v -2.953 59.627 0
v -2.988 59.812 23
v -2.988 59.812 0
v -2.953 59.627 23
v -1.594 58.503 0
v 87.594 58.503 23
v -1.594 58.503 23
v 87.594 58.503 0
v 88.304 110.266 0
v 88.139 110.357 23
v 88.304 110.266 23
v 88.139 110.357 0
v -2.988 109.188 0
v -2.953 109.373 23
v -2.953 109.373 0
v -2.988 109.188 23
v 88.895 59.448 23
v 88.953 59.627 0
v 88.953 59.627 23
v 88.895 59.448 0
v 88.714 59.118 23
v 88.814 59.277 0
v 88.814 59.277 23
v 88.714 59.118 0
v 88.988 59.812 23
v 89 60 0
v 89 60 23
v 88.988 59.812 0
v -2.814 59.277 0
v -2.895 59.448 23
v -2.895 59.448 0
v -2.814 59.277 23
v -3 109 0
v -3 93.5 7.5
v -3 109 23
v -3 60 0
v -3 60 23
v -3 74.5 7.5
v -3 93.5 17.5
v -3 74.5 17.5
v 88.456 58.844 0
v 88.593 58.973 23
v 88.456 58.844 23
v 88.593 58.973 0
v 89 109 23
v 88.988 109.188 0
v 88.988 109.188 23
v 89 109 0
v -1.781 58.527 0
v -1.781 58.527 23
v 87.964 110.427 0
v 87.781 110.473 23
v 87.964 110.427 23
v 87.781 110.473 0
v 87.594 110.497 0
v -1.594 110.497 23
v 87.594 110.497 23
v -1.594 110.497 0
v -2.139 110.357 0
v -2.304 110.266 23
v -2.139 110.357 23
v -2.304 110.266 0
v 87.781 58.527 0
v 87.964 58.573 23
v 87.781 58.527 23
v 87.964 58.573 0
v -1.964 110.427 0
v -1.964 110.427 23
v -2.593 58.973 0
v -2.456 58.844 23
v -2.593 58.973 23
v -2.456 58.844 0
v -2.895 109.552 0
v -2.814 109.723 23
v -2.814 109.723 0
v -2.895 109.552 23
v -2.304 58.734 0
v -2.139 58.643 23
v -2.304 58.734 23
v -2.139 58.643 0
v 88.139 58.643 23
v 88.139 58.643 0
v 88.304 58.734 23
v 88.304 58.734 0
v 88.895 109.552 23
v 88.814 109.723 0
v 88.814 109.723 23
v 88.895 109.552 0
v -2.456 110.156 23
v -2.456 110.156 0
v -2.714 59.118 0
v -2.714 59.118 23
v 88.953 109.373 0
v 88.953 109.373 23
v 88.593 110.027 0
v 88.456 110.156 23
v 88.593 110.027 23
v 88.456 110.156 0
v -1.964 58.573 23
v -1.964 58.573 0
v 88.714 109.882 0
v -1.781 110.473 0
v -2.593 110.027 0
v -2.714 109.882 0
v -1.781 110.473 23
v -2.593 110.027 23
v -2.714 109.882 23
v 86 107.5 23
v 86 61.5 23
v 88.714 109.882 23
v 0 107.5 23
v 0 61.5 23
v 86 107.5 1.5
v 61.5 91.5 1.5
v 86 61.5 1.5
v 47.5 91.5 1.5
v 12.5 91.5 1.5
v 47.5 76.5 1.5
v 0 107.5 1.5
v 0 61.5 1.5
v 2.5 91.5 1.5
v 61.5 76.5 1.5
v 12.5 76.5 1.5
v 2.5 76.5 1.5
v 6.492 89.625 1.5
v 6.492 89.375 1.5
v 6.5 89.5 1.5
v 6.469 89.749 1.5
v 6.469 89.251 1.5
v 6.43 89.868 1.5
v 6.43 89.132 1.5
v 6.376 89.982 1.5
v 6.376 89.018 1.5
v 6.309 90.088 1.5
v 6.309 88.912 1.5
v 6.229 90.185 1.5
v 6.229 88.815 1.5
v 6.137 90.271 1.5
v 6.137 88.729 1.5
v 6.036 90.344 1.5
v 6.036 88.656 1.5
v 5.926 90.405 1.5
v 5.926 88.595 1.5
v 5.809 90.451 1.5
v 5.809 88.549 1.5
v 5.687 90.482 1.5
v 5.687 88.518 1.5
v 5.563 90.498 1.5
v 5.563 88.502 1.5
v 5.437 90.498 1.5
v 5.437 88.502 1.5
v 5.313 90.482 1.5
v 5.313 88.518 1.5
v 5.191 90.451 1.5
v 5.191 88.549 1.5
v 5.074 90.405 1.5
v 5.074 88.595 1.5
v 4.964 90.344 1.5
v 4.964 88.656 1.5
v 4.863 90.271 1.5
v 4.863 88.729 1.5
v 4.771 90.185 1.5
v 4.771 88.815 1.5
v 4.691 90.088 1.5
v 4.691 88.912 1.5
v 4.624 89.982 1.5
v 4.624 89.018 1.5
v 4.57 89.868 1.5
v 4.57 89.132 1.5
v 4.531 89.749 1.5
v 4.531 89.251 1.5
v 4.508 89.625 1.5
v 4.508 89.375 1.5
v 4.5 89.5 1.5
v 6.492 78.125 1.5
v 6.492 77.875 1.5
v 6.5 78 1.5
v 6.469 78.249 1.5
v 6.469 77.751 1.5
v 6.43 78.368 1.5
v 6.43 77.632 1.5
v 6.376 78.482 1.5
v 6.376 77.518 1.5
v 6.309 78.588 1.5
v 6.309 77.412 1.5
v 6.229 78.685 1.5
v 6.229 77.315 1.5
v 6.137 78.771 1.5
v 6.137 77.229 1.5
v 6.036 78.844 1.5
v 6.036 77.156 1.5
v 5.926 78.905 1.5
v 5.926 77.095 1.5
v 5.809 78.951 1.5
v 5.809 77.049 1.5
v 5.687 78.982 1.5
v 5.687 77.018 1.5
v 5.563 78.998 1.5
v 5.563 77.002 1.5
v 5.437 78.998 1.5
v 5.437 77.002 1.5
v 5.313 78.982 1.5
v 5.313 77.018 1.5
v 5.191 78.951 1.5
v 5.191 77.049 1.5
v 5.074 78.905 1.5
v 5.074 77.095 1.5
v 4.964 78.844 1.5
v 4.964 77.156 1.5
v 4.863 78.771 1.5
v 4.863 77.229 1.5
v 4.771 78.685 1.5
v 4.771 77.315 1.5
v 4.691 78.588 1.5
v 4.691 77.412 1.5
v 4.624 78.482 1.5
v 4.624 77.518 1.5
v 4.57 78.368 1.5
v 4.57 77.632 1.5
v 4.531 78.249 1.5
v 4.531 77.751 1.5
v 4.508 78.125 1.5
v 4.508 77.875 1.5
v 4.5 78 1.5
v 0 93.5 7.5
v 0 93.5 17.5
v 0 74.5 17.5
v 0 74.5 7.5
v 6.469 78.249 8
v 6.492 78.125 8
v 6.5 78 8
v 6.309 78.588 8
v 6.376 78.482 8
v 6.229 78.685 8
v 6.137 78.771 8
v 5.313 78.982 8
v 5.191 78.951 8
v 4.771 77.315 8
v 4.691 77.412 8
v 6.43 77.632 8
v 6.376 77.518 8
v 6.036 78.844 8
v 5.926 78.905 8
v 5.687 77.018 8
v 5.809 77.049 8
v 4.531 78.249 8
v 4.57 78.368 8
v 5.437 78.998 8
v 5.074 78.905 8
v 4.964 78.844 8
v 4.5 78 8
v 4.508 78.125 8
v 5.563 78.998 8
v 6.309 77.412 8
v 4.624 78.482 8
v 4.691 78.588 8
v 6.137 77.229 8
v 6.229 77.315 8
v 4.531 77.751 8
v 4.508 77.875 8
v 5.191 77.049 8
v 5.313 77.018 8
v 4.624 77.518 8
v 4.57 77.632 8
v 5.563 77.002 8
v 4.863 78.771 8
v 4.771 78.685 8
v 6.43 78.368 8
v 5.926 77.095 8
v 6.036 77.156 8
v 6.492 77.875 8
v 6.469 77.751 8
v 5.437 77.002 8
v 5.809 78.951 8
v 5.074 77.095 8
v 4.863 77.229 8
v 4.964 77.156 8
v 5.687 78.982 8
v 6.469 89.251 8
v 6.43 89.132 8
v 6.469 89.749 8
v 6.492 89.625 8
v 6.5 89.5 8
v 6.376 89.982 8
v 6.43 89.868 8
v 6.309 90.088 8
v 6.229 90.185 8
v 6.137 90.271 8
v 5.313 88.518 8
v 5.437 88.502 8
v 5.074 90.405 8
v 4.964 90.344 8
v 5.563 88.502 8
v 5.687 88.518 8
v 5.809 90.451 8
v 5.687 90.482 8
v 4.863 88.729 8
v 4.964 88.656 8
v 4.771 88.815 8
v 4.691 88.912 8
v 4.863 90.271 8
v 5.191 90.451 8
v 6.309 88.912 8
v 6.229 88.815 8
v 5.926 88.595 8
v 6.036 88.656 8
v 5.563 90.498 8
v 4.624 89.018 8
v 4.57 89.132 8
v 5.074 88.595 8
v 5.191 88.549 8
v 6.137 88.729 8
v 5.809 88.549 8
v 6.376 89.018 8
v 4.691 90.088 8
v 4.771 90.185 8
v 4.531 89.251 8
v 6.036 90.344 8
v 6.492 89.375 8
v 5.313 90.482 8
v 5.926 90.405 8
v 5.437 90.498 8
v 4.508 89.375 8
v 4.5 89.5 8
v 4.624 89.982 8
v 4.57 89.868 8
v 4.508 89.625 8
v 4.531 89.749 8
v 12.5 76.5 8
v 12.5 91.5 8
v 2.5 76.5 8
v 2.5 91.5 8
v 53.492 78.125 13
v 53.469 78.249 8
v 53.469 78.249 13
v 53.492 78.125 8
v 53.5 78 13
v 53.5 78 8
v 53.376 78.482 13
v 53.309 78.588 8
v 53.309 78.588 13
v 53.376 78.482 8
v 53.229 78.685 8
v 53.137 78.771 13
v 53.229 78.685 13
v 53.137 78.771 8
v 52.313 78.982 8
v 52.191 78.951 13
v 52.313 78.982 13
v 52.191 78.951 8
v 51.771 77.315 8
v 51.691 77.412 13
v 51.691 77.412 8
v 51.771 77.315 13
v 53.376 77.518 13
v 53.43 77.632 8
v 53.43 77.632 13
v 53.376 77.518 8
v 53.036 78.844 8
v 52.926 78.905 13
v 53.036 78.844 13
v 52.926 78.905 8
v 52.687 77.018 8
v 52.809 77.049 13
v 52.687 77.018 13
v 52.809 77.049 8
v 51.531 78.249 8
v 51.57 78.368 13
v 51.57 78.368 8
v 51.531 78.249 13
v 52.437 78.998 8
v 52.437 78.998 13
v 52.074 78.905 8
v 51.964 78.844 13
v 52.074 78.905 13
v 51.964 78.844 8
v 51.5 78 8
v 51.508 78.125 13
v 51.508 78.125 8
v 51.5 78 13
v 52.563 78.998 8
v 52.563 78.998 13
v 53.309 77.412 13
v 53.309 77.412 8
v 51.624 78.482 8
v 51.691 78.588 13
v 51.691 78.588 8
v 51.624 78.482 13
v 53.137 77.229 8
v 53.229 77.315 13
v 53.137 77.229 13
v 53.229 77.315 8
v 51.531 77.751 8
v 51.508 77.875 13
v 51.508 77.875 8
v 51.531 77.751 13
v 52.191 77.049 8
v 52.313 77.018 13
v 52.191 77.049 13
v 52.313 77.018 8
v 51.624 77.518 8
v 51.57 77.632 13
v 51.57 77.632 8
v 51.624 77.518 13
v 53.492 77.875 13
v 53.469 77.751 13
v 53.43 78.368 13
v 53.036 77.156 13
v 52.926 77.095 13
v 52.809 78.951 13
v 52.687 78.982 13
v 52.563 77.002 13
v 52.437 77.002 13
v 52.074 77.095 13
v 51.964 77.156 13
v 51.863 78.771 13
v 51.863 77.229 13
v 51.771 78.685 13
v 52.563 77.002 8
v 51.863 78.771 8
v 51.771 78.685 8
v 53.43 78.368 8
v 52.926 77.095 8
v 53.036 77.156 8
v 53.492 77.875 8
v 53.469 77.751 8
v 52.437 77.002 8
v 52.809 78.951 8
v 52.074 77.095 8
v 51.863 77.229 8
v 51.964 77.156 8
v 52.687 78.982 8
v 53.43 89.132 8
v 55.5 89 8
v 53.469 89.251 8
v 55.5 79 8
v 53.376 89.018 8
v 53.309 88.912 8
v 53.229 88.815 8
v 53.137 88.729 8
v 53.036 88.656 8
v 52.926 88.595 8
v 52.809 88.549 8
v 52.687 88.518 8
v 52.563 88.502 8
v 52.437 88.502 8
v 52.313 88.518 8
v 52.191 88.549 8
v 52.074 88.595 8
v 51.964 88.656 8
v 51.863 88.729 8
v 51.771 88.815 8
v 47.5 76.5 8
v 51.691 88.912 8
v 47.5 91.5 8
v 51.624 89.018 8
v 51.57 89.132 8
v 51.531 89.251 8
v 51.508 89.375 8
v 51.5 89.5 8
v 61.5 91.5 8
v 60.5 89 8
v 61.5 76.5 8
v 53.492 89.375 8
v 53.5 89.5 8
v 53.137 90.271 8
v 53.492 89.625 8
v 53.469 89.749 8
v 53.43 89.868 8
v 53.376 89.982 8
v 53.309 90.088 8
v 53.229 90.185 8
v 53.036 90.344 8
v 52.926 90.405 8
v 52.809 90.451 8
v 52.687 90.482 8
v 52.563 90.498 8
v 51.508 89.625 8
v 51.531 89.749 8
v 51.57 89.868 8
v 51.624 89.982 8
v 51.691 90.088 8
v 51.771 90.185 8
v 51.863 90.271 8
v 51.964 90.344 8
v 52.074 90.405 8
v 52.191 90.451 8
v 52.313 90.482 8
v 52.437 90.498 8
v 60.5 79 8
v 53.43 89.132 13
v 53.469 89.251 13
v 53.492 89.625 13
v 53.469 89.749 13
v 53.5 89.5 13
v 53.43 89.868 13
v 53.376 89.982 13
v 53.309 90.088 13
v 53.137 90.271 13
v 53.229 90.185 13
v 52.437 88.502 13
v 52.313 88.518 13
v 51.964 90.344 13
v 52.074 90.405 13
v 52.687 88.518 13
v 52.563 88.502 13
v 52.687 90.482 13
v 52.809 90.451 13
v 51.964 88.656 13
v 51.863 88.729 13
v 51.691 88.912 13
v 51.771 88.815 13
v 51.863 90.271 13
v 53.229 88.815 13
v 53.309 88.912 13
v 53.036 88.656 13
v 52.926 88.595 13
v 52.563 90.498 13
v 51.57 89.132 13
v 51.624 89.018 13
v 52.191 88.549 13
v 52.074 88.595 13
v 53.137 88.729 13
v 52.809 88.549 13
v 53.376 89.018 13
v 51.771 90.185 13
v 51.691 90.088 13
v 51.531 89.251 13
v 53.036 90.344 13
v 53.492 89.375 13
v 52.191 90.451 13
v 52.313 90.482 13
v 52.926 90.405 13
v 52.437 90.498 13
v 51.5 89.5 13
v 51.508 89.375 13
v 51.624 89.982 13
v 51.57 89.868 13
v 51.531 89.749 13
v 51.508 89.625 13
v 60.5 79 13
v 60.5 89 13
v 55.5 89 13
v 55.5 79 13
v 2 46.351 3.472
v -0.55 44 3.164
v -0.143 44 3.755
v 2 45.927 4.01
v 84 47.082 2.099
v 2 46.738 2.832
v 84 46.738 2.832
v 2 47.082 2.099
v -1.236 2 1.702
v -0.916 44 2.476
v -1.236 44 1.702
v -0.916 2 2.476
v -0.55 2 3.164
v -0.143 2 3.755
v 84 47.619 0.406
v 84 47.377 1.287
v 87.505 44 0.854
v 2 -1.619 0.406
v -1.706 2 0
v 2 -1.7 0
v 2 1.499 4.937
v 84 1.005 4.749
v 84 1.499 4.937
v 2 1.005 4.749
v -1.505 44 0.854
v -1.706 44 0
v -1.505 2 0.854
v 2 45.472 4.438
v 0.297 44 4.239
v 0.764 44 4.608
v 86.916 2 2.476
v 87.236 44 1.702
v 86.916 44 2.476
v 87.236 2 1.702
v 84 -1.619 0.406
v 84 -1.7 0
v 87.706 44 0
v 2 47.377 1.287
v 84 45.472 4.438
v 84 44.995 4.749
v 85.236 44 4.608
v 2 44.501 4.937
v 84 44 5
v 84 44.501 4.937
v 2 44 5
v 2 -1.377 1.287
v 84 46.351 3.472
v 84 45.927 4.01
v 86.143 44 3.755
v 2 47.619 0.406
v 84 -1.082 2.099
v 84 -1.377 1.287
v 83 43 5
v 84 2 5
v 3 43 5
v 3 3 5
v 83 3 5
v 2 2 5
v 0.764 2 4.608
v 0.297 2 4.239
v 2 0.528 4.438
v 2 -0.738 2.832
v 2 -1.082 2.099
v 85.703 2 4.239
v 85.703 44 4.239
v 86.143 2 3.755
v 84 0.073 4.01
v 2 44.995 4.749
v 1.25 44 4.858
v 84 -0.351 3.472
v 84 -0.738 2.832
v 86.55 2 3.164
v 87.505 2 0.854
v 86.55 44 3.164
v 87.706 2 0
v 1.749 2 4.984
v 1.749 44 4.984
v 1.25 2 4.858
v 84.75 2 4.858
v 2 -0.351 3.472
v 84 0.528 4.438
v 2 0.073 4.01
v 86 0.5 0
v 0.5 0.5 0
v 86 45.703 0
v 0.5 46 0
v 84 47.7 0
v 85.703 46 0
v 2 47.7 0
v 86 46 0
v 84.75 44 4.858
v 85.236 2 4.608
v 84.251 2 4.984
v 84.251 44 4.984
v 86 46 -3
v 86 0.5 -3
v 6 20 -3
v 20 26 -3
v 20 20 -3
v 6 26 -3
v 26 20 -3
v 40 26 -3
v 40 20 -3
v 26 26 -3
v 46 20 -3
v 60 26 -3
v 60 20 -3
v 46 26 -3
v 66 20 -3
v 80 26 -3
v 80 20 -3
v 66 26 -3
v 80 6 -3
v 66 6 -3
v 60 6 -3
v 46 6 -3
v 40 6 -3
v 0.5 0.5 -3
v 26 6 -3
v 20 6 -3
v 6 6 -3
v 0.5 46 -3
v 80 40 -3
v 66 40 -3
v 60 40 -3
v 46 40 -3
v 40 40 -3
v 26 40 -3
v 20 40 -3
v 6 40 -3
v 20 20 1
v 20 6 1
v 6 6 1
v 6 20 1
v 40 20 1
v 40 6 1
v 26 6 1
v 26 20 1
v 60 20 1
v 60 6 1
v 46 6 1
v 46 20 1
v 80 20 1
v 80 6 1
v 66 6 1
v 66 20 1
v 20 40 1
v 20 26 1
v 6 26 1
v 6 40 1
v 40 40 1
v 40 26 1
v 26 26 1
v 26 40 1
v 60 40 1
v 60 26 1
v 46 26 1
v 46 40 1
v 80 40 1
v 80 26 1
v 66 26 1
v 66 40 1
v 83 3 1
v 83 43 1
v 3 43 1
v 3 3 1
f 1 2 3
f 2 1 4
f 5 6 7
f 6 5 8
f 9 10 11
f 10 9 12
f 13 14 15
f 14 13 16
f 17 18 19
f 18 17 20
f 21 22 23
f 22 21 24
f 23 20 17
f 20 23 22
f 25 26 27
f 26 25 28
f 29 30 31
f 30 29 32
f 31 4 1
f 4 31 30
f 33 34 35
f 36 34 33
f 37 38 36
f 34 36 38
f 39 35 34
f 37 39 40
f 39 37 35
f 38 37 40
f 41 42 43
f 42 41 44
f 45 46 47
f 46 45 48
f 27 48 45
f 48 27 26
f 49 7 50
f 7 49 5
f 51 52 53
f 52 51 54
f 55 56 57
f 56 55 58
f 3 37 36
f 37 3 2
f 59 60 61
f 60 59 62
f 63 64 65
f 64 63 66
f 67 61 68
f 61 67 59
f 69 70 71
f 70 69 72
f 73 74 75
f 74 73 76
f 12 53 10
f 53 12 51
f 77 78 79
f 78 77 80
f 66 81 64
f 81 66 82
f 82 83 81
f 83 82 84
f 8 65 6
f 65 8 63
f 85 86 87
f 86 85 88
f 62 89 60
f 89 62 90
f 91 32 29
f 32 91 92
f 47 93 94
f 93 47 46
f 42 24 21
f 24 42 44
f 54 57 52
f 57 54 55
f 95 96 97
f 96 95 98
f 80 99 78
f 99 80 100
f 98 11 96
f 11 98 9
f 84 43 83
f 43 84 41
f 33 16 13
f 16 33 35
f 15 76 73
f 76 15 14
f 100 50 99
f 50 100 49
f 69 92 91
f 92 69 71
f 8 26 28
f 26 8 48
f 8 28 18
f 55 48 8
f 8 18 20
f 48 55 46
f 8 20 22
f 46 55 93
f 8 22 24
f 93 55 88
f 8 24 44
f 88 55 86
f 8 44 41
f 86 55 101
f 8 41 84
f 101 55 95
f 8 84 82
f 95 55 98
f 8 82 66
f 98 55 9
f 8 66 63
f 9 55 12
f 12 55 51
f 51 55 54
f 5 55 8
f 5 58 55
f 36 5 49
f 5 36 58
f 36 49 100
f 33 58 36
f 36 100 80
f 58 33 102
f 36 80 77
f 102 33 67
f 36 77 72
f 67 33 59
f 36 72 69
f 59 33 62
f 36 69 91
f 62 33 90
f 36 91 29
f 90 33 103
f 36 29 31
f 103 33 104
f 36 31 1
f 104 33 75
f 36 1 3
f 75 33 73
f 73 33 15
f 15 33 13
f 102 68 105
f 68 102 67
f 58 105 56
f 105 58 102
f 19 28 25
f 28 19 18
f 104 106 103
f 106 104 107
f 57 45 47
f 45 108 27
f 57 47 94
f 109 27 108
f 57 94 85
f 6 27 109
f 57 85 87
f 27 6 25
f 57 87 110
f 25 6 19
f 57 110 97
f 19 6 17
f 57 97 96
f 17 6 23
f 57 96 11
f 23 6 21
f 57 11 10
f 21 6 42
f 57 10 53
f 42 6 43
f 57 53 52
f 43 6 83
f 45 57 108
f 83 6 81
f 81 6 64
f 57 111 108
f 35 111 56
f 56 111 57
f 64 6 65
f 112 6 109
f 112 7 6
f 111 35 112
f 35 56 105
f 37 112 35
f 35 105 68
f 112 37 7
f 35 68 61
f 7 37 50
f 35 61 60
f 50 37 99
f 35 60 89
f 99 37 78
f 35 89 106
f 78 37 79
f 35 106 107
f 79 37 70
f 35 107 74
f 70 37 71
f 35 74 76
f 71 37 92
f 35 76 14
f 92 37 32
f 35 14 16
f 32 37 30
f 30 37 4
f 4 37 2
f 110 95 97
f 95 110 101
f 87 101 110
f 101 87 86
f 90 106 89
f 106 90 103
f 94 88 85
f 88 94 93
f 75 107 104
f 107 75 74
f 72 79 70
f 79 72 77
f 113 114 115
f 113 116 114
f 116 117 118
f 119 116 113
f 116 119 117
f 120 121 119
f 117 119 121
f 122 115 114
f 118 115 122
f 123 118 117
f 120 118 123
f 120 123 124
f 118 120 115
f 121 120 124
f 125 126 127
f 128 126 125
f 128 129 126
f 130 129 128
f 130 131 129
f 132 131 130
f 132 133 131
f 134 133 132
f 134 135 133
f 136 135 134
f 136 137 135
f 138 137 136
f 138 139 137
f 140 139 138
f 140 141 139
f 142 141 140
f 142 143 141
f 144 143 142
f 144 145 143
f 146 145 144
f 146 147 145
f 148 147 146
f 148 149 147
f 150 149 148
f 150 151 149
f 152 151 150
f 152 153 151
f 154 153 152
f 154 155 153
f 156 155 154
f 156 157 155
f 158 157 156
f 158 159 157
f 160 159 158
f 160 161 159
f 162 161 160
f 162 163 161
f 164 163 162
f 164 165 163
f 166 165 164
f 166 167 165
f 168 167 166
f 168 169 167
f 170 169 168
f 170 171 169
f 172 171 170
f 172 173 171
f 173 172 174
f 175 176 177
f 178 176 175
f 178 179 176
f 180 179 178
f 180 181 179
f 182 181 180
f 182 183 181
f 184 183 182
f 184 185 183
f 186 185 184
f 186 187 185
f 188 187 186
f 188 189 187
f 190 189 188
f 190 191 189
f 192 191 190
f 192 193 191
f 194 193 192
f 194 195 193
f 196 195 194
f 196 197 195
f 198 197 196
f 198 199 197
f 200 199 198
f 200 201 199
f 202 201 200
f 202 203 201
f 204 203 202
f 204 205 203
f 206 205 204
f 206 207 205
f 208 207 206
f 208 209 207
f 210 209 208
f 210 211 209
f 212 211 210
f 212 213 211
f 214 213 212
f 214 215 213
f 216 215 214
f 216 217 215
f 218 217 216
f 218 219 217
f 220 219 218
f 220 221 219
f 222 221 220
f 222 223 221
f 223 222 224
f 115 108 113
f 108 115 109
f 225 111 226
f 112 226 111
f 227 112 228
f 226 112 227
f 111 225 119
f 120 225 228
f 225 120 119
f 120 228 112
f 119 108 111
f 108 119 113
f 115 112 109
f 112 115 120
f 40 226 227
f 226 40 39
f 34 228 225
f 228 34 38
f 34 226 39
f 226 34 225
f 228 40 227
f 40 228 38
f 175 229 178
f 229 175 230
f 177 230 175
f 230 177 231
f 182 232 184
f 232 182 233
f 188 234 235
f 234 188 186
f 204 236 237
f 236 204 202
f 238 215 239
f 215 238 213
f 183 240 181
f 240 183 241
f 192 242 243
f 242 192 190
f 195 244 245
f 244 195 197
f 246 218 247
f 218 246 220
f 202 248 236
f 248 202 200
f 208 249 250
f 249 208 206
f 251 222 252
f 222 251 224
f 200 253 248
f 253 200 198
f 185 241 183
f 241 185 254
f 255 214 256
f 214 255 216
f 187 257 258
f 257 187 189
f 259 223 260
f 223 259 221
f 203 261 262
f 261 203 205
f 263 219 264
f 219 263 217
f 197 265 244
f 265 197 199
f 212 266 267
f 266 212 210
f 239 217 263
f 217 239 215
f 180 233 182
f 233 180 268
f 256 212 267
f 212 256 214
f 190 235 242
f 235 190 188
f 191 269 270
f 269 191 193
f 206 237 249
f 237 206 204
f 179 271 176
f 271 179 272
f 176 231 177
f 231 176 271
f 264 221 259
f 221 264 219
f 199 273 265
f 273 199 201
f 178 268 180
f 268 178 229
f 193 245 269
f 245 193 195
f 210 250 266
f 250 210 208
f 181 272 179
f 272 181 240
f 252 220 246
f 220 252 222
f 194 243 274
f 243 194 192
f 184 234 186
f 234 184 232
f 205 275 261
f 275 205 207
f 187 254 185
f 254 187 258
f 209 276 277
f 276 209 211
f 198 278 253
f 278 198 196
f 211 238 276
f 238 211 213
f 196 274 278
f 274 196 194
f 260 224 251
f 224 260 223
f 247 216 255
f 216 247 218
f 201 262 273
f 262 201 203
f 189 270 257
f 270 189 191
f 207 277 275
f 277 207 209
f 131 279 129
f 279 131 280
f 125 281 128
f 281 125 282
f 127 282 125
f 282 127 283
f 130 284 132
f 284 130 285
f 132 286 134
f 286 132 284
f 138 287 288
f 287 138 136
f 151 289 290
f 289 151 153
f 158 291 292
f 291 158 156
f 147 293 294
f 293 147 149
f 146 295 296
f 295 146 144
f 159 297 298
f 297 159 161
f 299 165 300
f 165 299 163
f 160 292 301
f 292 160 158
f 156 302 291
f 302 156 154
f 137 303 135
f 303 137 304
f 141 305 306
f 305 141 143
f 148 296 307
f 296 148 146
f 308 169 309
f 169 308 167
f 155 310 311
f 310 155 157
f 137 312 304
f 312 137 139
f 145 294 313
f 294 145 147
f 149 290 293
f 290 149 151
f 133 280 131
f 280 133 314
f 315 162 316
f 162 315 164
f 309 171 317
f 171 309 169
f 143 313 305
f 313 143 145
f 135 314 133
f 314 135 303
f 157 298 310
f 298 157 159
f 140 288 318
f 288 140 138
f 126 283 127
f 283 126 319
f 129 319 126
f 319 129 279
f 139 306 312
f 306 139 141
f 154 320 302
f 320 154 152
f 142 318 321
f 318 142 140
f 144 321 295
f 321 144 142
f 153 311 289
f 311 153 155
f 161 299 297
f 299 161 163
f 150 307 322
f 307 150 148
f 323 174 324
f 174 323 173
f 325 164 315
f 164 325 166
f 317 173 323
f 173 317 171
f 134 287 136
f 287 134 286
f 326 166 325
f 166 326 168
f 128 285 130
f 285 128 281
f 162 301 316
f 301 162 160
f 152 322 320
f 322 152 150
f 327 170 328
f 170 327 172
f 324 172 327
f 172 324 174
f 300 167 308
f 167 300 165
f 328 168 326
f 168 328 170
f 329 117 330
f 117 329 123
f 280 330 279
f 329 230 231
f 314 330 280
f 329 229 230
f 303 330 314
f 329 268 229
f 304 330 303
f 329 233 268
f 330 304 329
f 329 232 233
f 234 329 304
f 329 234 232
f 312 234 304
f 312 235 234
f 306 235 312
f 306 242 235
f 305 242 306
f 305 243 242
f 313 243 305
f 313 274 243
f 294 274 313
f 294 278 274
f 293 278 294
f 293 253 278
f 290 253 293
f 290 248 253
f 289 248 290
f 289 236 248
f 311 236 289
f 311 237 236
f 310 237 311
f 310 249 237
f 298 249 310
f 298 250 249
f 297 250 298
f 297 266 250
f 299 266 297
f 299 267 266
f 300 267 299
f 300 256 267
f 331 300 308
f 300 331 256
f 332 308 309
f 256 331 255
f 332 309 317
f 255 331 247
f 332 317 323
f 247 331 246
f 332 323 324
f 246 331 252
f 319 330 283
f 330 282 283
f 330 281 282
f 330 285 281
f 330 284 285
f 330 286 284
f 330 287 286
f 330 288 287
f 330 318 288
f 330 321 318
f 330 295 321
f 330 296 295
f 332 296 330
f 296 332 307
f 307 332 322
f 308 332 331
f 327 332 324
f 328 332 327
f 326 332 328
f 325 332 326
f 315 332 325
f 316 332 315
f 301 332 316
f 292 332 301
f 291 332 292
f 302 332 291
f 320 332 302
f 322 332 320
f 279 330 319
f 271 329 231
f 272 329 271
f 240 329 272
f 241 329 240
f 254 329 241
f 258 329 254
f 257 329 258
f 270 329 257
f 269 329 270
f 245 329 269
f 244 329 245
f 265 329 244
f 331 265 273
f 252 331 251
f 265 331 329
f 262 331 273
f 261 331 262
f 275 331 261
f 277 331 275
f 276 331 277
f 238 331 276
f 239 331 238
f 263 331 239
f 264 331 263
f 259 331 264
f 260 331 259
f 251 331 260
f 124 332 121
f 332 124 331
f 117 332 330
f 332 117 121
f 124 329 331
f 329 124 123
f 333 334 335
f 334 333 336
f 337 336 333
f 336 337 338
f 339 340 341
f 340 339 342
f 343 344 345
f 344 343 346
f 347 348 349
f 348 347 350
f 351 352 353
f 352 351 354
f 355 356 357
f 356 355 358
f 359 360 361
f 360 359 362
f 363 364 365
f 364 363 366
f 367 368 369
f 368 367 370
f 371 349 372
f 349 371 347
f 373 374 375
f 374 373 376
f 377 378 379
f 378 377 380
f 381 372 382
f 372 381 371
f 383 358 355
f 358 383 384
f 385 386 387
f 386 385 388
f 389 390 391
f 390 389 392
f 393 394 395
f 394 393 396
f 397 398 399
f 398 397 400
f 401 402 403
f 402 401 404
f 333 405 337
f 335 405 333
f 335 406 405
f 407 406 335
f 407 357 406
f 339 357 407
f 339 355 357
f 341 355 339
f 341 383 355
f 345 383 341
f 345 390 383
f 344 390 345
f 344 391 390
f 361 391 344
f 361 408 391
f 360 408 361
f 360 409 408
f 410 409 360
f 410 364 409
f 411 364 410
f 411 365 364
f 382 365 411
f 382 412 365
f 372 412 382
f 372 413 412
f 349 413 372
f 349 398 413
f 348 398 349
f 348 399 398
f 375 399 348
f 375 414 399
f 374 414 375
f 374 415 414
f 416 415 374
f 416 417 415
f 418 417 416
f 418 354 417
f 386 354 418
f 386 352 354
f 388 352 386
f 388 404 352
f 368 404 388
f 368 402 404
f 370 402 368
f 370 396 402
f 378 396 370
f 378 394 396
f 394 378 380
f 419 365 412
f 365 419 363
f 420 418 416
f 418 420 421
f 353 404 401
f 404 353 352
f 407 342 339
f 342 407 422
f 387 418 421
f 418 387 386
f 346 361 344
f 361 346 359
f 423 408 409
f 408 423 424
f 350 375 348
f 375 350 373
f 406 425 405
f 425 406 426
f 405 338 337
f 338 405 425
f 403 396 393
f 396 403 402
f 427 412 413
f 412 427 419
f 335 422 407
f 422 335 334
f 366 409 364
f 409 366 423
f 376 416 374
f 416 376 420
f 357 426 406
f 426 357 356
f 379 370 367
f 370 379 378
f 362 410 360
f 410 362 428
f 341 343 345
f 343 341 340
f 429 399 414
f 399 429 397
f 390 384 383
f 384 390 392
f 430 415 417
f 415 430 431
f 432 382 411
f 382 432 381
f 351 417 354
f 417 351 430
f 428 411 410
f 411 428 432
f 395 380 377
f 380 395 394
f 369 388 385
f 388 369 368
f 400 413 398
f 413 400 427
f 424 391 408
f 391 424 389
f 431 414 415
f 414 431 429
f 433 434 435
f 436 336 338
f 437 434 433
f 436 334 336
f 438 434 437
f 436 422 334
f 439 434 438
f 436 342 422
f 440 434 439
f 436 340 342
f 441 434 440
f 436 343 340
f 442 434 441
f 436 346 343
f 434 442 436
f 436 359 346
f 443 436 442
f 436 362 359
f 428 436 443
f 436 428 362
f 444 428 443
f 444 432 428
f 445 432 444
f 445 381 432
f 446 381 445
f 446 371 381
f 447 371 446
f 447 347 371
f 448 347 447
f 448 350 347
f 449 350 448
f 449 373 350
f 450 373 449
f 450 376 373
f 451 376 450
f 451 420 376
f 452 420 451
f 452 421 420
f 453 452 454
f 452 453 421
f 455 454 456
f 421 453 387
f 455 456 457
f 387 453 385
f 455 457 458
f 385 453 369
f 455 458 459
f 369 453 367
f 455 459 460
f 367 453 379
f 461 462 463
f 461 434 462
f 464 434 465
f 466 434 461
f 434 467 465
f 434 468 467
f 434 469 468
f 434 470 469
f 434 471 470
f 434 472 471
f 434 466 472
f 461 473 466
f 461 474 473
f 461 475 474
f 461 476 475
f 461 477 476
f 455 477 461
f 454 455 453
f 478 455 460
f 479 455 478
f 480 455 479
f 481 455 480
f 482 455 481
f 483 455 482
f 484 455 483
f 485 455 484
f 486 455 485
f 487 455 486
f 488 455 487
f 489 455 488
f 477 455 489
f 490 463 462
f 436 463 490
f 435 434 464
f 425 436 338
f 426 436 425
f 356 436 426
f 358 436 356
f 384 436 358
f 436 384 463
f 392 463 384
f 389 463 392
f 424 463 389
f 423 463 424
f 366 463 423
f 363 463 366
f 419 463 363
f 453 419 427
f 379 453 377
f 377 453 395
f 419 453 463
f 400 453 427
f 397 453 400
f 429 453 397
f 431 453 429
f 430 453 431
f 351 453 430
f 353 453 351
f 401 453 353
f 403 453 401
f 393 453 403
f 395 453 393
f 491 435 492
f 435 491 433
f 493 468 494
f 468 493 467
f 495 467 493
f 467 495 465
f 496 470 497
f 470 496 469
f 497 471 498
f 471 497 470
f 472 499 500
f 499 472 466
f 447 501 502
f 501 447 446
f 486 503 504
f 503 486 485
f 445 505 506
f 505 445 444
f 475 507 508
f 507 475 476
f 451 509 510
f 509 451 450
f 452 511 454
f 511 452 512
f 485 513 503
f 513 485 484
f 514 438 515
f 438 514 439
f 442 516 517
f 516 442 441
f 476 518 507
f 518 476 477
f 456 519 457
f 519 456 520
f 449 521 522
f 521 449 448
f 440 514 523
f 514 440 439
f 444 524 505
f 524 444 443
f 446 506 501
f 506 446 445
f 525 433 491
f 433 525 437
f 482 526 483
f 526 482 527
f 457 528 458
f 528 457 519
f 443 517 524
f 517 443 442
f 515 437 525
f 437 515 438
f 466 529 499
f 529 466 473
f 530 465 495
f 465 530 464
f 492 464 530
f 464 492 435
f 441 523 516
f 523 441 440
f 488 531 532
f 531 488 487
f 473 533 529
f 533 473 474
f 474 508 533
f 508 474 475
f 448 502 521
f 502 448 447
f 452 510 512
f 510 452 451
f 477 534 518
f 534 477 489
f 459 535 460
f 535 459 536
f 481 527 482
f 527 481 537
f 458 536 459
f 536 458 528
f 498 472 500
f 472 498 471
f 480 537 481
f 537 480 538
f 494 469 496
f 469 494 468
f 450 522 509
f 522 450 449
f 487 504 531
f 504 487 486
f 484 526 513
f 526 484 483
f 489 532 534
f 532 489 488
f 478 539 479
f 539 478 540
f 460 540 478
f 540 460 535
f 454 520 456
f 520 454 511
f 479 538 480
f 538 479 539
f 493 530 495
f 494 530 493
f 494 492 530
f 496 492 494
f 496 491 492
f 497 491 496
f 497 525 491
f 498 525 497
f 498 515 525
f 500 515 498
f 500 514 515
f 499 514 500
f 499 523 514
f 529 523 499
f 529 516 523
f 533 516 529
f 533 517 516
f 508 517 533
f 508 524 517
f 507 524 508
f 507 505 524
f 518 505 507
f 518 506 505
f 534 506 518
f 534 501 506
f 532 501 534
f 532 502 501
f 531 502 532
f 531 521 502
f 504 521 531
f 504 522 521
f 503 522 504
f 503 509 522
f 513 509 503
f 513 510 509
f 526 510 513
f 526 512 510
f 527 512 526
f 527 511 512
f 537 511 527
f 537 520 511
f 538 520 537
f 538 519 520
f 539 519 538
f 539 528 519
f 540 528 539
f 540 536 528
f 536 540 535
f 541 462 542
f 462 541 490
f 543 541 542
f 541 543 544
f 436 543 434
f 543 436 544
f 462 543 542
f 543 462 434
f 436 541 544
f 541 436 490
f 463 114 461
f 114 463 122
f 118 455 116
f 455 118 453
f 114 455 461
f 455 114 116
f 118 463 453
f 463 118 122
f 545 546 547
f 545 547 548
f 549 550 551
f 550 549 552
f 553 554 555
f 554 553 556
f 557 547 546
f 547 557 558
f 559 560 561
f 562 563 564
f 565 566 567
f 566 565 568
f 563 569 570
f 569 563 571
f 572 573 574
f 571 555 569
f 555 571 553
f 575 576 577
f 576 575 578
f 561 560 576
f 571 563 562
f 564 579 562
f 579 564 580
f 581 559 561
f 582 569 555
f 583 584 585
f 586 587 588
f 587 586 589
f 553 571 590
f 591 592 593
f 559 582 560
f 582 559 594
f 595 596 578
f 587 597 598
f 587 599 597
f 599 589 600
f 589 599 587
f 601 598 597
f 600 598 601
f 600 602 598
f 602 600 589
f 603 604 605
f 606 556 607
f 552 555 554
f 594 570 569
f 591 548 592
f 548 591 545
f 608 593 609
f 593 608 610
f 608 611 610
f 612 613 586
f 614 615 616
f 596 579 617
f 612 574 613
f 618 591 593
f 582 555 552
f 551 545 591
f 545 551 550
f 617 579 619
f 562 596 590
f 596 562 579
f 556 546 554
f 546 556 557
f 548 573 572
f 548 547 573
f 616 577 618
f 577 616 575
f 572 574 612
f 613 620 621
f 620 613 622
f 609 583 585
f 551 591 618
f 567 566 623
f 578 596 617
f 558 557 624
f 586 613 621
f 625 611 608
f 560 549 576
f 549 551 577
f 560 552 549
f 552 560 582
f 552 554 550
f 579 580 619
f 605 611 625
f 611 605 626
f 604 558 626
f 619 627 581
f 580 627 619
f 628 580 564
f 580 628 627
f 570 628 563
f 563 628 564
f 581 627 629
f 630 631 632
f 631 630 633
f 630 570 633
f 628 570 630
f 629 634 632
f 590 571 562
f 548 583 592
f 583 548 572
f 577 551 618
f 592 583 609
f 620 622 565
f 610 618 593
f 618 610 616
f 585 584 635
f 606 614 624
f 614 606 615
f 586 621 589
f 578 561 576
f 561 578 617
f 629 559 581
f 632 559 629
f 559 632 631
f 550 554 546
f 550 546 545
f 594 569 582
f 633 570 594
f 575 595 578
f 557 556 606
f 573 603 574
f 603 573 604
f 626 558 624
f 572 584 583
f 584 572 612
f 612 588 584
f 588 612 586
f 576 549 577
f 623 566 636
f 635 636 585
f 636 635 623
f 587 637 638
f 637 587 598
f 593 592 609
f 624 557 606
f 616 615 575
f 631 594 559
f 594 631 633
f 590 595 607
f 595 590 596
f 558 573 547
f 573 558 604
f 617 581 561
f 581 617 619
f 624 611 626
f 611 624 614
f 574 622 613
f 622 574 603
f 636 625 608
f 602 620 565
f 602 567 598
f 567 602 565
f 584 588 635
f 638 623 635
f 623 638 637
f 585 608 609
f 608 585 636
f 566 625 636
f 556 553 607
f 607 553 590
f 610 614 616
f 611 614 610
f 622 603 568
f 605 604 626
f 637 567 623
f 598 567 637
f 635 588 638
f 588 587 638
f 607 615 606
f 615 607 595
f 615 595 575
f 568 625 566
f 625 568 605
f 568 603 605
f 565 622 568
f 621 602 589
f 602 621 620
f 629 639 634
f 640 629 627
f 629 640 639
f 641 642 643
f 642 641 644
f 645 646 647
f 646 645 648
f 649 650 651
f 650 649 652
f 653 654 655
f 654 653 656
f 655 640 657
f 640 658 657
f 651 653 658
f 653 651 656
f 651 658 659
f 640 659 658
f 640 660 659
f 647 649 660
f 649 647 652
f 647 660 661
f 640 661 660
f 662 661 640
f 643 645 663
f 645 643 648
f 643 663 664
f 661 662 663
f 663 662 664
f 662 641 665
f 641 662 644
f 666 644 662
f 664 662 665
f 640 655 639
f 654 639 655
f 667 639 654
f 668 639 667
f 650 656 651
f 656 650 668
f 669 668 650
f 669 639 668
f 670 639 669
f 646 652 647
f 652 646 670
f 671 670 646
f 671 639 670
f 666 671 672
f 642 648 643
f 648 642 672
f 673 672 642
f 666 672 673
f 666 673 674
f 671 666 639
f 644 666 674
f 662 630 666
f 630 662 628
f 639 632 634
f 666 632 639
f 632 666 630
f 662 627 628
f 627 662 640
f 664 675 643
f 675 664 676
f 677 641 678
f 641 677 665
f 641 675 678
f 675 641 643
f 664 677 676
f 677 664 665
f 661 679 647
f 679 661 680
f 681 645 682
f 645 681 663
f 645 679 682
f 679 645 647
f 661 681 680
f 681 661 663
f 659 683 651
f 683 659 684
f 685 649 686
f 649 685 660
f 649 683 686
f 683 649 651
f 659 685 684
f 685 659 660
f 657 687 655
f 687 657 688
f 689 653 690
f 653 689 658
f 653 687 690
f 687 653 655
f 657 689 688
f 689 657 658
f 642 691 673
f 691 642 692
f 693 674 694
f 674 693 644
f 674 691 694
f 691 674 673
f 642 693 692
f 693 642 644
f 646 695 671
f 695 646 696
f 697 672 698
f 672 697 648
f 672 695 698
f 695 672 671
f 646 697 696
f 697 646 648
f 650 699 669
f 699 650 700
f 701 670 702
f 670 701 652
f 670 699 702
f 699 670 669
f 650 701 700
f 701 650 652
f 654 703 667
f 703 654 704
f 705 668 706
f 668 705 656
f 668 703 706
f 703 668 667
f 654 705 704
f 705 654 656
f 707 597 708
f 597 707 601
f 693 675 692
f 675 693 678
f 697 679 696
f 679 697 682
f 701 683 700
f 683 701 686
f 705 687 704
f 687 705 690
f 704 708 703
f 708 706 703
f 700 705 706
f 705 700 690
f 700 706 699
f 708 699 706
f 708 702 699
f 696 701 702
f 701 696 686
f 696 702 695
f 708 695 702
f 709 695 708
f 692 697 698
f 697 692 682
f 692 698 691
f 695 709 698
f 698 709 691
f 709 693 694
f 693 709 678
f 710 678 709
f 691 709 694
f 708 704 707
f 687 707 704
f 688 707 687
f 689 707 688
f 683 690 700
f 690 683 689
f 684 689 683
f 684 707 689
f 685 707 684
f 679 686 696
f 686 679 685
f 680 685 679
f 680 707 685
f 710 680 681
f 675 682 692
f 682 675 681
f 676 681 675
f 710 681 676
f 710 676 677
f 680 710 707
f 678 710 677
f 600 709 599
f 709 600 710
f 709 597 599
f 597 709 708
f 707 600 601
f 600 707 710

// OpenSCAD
$fn=50;
// distance between wells
wellSpacing = 6;

roundR = 1.5;

keySide = 14;

// the depth of the top "key holder"
baseDepth = 1;
topToLip = 4;

rows=2;
cols=4;

// wall depth for base
wall = 1.5;
// heigth of base
bottomH = 23;

baseW = wellSpacing + cols * (wellSpacing+keySide);
baseH = wellSpacing + rows * (wellSpacing+keySide);
module switchHole() {
 cube ([keySide, keySide, keySide]);
}

module kBase() {
    cube([
        baseW, 
        baseH,
        baseDepth
    ]);
}

module screwTab() {
   cylinder(h=baseDepth, d=7);
}

module screwHole() {
    cylinder(h=baseDepth, d=3);
}


lip = 8;
// rounded top 
module rTop() {
    translate([0,0,-3]) {
        hull() {
            difference() {
                union() {
                    
                    rotate(a=[-90,0,0]) {
                        translate([2, 0, 2]) {
                            linear_extrude(height=baseH-4, center=false) {
                                scale([0.5, 1]) circle(lip);
                            } 
                        }
                        translate([baseW-2, 0, 2]) {
                            linear_extrude(height=baseH-4, center=false) {
                                scale([0.5, 1]) circle(lip);
                            } 
                        }
                    }
                    
                    rotate(a=[0,90,0]) {
                        translate([0, 2, 2]) {
                            linear_extrude(height=baseW-4, center=false) {
                                scale([1, 0.5]) circle(lip);
                            } 
                        }
                        translate([0, baseH-2, 2]) {
                            linear_extrude(height=baseW-4, center=false) {
                                scale([1, 0.5]) circle(lip);
                            } 
                        }
                    }
                    
                }
                // chop off the bottom
                translate([-0.25*baseW, -0.25*baseH,3-bottomH]) {
                    cube([1.5*baseW,1.5*baseH,bottomH]);
                }
            } //difference
        } //hull
        
    } //translate
    
    
}

module wells() {
    for (i = [1:1:rows]) {
        yoff = wellSpacing + ((i-1) * (wellSpacing+keySide));
        for (j = [1:1:cols]) {
            xoff = wellSpacing + ((j-1) * (wellSpacing + keySide));
            translate([xoff, yoff, 0]) {
                switchHole();
            }
        }
    }
}

// create the grid to hold the switches
module top() {
    difference() {
        union() {
            rTop();
            translate([0.5,0.5,-topToLip+1]) color([1,0,1])cube([baseW-0.5, baseH-0.5, topToLip-1]);
        }
        // cut into the rounding, but not all the way to the bottom
        translate([2*wall, 2*wall, baseDepth]) {
            cube([baseW-4*wall, baseH-4*wall, bottomH]);
        }
        translate([0, 0, -3]) {
            color([0.25,0.25,0]) wells();
        }
    }    
    
}


// studs will hold a pico pi
module picoSupport() {
    h = 8;
    union() {
        color([0,1,0]) {
            difference (){
                cube([10, 15, h]); //base-front
                translate([3,1.5,0]) {
                    translate([0, 0, 0]) cylinder(h=10, d=2);
                    translate([0, 11.5, 0]) cylinder(h=10, d=2);
                }
            }
            translate([45,0,0]) cube([14, 15, h]); //base-back
            translate([50,1.5,h]) {
                translate([0, 0, 0]) cylinder(h=5, d=2);
                translate([0, 11.5, 0]) cylinder(h=5, d=2);
                translate([3,1,0])  cube([5,10,5]); //backstop
            }
        }
    }
}

module rounded_box(x, y, z, radius){
    hull(){
        for (i = [0, x]) {
            for (j = [0, y]) {
                translate([i, j, 0]) {
                    cylinder(r=radius, h=z);
                }
            }
        }
    }
}
module bottom() {
    color([1,0,0]) {
            difference () {
                rounded_box(baseW+2*wall, baseH+2*wall, bottomH, roundR);
                //cube([baseW+2*wall, baseH+2*wall, bottomH]);
                
                //center all inside lip
                translate([wall+2,wall+2, wall]) {
                    cube([baseW-topToLip, baseH-topToLip, bottomH]);
                }
                // twice for a lip:
                // below the lip
                translate([wall,wall, wall]) {
                    cube([baseW, baseH, bottomH]);
                }
            }
        }
        // support studs
    }    


module main() {
    debug = false;
    //top();
    difference() {
        translate([-wall,60, 0]) {
            difference() {
                bottom();
                // make a hole for the usb plub
                translate([-10, wall+13, 5*wall]) {
                    cube([13, 19, 10]);
                }
            }
        }
    
        if (debug) {         // cut off a bunch
            translate([-50,50,-1]) {
                cube([200,20,30]);
            }
            translate([-50,100,-1]) {
                cube([200,20,30]);
            }
            translate([70,40,-1]) {
                cube([20,100,30]);
            }    
        }
    }
    
    translate([2.5, 75+wall, 0]) {//-wall, -wall, 25]) {            
        picoSupport();
    }



}


main();
top();
